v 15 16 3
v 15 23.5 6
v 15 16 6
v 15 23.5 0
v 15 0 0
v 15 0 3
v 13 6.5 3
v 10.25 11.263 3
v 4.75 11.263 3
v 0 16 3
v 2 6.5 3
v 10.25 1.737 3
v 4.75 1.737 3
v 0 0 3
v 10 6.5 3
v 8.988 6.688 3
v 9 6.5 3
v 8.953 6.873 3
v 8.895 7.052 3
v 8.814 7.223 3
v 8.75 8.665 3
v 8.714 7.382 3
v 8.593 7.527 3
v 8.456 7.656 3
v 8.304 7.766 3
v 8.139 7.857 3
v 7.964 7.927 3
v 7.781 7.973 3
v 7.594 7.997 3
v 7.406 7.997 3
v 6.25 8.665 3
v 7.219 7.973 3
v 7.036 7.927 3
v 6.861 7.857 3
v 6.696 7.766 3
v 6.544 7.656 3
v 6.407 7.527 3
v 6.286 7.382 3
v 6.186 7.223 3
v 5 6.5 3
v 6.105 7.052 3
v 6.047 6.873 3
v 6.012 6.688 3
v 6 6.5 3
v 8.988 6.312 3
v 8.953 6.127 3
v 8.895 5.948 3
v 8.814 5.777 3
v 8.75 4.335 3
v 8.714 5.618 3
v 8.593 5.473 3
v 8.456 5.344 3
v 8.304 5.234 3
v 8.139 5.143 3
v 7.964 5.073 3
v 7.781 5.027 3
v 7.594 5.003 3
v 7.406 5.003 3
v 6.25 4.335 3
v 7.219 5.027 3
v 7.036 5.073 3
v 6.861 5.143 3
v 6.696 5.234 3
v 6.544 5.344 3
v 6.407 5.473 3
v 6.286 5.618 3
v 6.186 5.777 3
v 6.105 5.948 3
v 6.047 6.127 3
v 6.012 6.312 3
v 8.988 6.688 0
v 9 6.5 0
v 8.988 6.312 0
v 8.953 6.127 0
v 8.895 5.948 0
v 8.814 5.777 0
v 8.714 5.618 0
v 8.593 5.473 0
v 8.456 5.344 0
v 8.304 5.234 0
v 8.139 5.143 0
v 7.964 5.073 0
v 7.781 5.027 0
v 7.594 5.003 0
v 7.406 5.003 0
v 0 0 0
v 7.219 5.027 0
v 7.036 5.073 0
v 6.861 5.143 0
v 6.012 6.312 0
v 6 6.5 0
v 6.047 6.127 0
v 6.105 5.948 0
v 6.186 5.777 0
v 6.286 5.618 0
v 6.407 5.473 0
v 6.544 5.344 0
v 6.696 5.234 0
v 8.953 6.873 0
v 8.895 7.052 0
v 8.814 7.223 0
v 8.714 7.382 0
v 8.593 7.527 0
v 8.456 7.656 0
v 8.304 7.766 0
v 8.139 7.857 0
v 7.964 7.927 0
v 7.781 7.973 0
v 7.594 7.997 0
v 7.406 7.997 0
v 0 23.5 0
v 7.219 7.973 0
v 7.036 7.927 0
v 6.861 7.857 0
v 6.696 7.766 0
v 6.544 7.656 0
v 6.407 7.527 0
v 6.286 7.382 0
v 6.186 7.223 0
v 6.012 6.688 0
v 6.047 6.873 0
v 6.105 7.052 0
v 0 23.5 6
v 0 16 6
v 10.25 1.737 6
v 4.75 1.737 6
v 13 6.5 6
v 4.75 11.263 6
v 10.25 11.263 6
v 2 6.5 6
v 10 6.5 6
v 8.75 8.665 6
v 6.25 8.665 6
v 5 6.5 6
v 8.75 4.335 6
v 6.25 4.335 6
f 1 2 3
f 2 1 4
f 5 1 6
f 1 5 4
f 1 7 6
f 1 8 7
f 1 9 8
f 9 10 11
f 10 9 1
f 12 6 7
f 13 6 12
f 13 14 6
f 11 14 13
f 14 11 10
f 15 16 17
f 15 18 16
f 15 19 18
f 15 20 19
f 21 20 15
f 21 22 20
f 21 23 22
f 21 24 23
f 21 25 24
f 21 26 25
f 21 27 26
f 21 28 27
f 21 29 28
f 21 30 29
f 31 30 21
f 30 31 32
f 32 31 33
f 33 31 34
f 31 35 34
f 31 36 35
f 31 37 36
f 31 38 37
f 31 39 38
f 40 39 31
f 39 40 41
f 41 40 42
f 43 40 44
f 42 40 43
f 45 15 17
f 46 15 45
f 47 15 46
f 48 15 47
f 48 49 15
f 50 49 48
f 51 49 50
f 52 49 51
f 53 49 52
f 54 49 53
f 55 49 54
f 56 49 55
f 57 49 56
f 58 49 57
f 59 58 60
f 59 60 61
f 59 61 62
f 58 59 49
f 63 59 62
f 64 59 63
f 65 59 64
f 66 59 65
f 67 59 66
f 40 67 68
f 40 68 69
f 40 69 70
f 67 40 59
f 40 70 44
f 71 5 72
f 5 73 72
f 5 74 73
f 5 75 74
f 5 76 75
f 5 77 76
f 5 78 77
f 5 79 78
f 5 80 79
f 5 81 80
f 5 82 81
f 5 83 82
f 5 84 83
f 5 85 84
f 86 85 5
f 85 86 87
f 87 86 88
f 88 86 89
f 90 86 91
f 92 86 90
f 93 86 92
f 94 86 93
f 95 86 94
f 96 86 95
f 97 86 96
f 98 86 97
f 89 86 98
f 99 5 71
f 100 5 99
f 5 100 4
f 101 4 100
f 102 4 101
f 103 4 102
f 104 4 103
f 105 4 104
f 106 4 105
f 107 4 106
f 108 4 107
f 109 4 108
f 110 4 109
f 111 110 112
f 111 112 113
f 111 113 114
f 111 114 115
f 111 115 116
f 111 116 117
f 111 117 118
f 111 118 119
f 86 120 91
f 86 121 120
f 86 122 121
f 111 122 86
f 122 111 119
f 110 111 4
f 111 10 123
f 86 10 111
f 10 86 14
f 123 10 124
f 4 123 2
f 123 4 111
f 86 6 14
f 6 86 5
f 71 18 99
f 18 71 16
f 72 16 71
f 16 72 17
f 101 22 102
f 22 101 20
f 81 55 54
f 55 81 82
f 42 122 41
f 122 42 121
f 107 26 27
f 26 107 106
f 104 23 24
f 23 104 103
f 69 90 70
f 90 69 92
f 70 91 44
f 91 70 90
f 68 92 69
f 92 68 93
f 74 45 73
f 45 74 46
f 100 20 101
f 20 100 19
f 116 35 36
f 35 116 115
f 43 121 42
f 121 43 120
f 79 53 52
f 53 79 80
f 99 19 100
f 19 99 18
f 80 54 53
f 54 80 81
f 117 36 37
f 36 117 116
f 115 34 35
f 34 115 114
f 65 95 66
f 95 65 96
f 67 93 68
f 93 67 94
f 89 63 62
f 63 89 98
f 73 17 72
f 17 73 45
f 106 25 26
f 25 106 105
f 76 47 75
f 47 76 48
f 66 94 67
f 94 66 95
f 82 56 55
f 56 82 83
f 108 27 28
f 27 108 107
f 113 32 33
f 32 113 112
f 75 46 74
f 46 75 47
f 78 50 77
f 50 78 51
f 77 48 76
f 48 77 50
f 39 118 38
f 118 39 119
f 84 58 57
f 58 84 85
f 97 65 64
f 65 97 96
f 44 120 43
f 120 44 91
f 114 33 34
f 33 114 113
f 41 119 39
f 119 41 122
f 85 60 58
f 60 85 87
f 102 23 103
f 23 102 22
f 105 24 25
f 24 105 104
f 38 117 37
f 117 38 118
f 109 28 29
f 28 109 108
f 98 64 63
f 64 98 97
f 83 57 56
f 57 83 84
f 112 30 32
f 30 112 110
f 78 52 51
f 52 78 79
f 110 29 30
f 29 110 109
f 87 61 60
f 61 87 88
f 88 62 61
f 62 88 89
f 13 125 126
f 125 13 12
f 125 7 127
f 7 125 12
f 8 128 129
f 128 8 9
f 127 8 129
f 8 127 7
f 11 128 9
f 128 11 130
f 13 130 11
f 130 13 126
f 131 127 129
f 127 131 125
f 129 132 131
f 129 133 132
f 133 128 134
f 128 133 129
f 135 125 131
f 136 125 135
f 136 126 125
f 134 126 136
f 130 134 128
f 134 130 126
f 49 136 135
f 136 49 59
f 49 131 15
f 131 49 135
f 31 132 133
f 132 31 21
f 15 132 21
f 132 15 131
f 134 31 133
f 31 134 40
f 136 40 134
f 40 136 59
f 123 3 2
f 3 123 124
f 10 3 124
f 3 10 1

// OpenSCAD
w = 15;
h = 3;
nut = 10;
nut_margin = 3;
nut_h = 5;
tube = 4.5;
tube_margin = 3;


module plate(){
	cube([w,nut+nut_margin*2+tube+tube_margin,h]);
}

module hex(){
	$fn=6;
	translate([w/2,nut_h+nut_margin/2,h]){
		difference(){
			cylinder(h,nut_h/2+nut_margin,nut_h/2+nut_margin);
			cylinder(h,nut_h/2,nut_h/2);
		}
	}
}

module tube(){
	translate([0,nut+nut_margin*2,h]){
		cube([w,tube+tube_margin,h]);
	}
}

module screw_hole(){
	$fn=50;
	cylinder(h,3/2,3/2);
}
difference(){
	plate(); 
	translate([w/2,nut_h+nut_margin/2,0]) screw_hole();
}
hex();
tube();
